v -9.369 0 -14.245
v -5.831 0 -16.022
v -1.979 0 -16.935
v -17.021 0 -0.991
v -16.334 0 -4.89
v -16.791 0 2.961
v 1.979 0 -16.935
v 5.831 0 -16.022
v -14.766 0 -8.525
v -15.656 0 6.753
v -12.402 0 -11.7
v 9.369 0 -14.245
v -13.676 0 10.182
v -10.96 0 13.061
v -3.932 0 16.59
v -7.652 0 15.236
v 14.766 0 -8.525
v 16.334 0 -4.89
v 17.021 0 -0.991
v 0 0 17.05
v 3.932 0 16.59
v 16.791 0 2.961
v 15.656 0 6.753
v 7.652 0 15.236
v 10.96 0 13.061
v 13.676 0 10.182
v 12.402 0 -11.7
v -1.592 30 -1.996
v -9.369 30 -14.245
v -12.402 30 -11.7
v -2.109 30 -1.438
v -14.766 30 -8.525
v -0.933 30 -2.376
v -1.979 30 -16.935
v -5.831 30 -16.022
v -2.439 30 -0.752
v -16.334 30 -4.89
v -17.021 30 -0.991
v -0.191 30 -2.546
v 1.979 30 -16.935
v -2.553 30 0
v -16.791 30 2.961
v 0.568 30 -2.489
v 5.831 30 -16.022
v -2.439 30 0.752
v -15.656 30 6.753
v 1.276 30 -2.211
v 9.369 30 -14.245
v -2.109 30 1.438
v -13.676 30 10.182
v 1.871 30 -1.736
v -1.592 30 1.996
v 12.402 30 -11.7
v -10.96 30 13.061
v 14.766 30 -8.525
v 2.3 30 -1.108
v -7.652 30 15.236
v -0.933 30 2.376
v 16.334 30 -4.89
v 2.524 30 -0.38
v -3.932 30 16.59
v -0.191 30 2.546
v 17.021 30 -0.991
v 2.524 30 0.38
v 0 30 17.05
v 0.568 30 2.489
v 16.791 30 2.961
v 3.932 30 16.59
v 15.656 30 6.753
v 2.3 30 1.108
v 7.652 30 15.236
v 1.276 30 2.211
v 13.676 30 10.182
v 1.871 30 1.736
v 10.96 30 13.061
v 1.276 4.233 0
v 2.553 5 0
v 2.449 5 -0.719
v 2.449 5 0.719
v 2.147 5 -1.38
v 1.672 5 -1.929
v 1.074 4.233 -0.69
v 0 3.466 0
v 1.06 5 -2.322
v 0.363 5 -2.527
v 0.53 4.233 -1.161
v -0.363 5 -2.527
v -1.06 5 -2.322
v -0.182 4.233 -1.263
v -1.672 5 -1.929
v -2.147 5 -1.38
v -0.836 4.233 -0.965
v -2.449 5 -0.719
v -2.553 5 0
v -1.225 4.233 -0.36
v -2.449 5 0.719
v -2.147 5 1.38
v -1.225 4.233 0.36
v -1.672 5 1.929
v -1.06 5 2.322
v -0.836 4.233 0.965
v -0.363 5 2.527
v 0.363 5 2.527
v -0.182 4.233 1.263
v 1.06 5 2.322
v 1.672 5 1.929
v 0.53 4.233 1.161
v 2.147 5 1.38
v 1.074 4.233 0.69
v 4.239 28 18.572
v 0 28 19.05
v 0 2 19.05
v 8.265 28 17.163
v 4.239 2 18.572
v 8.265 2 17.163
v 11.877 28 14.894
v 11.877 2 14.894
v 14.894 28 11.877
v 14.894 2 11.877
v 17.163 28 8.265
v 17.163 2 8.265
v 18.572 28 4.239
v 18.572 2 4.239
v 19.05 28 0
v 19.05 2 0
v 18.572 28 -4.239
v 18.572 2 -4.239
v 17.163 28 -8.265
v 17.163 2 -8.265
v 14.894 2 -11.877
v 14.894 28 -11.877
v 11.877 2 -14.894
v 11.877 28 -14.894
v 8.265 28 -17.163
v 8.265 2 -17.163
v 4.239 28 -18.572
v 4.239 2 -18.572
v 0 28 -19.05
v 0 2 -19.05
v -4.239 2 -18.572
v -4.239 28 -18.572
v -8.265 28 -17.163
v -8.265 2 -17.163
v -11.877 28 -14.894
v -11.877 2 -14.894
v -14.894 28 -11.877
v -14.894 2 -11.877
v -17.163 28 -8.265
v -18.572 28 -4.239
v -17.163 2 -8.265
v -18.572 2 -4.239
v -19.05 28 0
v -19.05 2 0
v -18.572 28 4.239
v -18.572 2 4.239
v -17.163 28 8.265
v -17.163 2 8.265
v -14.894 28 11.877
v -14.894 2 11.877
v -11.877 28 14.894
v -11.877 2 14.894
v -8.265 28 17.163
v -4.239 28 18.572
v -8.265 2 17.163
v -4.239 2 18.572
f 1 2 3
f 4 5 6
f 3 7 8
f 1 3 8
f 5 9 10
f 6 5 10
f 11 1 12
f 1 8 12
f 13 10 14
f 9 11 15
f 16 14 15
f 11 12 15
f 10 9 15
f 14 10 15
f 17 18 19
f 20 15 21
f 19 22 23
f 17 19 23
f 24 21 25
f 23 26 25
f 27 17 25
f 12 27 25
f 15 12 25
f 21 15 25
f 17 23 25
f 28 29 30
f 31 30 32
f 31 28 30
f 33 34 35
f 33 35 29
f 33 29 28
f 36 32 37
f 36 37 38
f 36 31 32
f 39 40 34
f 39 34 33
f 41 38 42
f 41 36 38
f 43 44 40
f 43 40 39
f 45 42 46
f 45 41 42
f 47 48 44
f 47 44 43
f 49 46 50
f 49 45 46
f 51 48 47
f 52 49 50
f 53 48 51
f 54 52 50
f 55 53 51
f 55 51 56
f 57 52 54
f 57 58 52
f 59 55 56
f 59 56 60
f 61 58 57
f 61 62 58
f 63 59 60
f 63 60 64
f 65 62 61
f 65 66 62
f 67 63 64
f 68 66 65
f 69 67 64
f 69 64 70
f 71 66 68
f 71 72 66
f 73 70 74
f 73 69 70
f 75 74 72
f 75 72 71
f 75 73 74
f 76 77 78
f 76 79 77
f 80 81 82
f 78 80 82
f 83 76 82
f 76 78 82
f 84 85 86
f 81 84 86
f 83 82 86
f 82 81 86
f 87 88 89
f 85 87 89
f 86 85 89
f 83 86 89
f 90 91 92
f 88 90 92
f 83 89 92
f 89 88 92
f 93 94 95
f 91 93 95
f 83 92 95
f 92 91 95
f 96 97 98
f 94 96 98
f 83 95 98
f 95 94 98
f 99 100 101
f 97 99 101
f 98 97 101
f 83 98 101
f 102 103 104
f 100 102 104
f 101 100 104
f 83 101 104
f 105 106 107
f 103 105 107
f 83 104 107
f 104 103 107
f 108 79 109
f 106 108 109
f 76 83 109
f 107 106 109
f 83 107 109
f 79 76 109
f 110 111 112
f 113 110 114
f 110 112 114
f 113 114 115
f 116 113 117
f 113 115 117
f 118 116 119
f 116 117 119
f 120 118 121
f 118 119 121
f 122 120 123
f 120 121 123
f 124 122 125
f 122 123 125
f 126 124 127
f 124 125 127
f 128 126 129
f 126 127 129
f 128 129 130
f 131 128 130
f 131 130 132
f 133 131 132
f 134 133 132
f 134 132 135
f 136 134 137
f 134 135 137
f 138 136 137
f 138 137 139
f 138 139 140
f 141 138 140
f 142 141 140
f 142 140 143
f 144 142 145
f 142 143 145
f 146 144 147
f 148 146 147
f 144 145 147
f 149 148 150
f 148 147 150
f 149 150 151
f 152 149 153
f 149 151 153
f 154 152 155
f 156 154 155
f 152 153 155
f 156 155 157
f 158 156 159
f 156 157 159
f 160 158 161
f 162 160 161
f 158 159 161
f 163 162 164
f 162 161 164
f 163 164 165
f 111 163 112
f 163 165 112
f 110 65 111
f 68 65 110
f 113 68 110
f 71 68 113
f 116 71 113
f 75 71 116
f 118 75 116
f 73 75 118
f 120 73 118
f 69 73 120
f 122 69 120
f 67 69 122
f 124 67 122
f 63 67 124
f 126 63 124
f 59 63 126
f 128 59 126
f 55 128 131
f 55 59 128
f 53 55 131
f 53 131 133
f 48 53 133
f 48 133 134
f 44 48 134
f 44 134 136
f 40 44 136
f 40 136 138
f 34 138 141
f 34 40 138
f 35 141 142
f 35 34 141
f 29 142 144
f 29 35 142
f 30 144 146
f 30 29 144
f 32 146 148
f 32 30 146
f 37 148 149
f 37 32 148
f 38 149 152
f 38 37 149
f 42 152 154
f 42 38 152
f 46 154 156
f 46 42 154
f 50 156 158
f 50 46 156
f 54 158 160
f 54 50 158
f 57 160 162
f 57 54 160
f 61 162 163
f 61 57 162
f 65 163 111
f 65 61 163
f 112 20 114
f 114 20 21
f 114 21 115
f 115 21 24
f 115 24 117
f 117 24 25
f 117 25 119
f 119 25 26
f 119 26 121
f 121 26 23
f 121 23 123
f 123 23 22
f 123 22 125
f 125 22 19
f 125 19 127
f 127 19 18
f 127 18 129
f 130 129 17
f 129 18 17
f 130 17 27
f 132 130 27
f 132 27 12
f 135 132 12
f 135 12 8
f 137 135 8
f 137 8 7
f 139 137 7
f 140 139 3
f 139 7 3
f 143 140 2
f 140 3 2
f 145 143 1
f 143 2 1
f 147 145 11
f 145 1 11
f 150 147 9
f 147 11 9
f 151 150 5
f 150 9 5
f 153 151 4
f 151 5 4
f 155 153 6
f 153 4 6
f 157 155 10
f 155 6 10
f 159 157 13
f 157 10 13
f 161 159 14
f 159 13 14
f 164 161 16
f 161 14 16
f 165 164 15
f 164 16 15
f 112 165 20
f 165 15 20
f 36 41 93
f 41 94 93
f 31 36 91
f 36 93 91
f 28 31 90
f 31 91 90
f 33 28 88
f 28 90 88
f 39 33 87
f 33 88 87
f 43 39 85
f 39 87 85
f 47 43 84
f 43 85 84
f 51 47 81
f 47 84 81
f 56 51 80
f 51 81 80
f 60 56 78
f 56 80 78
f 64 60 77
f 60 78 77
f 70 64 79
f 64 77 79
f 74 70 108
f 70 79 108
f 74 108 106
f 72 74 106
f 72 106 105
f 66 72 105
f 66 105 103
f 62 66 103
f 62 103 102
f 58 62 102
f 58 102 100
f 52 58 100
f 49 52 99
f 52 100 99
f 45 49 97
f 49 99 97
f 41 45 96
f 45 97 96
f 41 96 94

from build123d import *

# Parameters (mm, degrees)
CROQUIS1_R                    = 19.05
SALIENTE_EXTRUIR1_DEPTH       = 30
CHAFL_N1_SIZE                 = 2
TALADRO_ROSCADO_1_4_201_D     = 5.1054
TALADRO_ROSCADO_1_4_201_DEPTH = 25
TALADRO_ROSCADO_1_4_201_TIP   = 1.533816902
CHAFL_N2_SIZE                 = 2


with BuildPart() as part:
    # Croquis1 → Saliente-Extruir1 (new body)
    with BuildSketch(Plane(origin=(0, 0, 0), x_dir=(1, 0, 0), z_dir=(0, 1, 0))):
        with Locations(Location((0, 0, 0), (0, 0, 270))):
            Circle(CROQUIS1_R)
    extrude(amount=SALIENTE_EXTRUIR1_DEPTH)

    # Chaflán1
    chafl_n1_edges = [part.edges().sort_by_distance(p)[0] for p in [
        (0, 30, -19.05),
    ]]
    chamfer(chafl_n1_edges, length=CHAFL_N1_SIZE)

    # Taladro roscado 1/4-201
    with Locations(Plane(origin=(0, 30, 0), x_dir=(1, 0, 0), z_dir=(0, 1, 0))):
        with Locations((0, 0)):
            Hole(TALADRO_ROSCADO_1_4_201_D / 2, depth=TALADRO_ROSCADO_1_4_201_DEPTH)
            with Locations((0, 0, -(TALADRO_ROSCADO_1_4_201_DEPTH + TALADRO_ROSCADO_1_4_201_TIP / 2))):  # 118° drill point
                Cone(0, TALADRO_ROSCADO_1_4_201_D / 2, TALADRO_ROSCADO_1_4_201_TIP, mode=Mode.SUBTRACT)

    # Chaflán2
    chafl_n2_edges = [part.edges().sort_by_distance(p)[0] for p in [
        (0, 0, -19.05),
    ]]
    chamfer(chafl_n2_edges, length=CHAFL_N2_SIZE)


solid = part.part
